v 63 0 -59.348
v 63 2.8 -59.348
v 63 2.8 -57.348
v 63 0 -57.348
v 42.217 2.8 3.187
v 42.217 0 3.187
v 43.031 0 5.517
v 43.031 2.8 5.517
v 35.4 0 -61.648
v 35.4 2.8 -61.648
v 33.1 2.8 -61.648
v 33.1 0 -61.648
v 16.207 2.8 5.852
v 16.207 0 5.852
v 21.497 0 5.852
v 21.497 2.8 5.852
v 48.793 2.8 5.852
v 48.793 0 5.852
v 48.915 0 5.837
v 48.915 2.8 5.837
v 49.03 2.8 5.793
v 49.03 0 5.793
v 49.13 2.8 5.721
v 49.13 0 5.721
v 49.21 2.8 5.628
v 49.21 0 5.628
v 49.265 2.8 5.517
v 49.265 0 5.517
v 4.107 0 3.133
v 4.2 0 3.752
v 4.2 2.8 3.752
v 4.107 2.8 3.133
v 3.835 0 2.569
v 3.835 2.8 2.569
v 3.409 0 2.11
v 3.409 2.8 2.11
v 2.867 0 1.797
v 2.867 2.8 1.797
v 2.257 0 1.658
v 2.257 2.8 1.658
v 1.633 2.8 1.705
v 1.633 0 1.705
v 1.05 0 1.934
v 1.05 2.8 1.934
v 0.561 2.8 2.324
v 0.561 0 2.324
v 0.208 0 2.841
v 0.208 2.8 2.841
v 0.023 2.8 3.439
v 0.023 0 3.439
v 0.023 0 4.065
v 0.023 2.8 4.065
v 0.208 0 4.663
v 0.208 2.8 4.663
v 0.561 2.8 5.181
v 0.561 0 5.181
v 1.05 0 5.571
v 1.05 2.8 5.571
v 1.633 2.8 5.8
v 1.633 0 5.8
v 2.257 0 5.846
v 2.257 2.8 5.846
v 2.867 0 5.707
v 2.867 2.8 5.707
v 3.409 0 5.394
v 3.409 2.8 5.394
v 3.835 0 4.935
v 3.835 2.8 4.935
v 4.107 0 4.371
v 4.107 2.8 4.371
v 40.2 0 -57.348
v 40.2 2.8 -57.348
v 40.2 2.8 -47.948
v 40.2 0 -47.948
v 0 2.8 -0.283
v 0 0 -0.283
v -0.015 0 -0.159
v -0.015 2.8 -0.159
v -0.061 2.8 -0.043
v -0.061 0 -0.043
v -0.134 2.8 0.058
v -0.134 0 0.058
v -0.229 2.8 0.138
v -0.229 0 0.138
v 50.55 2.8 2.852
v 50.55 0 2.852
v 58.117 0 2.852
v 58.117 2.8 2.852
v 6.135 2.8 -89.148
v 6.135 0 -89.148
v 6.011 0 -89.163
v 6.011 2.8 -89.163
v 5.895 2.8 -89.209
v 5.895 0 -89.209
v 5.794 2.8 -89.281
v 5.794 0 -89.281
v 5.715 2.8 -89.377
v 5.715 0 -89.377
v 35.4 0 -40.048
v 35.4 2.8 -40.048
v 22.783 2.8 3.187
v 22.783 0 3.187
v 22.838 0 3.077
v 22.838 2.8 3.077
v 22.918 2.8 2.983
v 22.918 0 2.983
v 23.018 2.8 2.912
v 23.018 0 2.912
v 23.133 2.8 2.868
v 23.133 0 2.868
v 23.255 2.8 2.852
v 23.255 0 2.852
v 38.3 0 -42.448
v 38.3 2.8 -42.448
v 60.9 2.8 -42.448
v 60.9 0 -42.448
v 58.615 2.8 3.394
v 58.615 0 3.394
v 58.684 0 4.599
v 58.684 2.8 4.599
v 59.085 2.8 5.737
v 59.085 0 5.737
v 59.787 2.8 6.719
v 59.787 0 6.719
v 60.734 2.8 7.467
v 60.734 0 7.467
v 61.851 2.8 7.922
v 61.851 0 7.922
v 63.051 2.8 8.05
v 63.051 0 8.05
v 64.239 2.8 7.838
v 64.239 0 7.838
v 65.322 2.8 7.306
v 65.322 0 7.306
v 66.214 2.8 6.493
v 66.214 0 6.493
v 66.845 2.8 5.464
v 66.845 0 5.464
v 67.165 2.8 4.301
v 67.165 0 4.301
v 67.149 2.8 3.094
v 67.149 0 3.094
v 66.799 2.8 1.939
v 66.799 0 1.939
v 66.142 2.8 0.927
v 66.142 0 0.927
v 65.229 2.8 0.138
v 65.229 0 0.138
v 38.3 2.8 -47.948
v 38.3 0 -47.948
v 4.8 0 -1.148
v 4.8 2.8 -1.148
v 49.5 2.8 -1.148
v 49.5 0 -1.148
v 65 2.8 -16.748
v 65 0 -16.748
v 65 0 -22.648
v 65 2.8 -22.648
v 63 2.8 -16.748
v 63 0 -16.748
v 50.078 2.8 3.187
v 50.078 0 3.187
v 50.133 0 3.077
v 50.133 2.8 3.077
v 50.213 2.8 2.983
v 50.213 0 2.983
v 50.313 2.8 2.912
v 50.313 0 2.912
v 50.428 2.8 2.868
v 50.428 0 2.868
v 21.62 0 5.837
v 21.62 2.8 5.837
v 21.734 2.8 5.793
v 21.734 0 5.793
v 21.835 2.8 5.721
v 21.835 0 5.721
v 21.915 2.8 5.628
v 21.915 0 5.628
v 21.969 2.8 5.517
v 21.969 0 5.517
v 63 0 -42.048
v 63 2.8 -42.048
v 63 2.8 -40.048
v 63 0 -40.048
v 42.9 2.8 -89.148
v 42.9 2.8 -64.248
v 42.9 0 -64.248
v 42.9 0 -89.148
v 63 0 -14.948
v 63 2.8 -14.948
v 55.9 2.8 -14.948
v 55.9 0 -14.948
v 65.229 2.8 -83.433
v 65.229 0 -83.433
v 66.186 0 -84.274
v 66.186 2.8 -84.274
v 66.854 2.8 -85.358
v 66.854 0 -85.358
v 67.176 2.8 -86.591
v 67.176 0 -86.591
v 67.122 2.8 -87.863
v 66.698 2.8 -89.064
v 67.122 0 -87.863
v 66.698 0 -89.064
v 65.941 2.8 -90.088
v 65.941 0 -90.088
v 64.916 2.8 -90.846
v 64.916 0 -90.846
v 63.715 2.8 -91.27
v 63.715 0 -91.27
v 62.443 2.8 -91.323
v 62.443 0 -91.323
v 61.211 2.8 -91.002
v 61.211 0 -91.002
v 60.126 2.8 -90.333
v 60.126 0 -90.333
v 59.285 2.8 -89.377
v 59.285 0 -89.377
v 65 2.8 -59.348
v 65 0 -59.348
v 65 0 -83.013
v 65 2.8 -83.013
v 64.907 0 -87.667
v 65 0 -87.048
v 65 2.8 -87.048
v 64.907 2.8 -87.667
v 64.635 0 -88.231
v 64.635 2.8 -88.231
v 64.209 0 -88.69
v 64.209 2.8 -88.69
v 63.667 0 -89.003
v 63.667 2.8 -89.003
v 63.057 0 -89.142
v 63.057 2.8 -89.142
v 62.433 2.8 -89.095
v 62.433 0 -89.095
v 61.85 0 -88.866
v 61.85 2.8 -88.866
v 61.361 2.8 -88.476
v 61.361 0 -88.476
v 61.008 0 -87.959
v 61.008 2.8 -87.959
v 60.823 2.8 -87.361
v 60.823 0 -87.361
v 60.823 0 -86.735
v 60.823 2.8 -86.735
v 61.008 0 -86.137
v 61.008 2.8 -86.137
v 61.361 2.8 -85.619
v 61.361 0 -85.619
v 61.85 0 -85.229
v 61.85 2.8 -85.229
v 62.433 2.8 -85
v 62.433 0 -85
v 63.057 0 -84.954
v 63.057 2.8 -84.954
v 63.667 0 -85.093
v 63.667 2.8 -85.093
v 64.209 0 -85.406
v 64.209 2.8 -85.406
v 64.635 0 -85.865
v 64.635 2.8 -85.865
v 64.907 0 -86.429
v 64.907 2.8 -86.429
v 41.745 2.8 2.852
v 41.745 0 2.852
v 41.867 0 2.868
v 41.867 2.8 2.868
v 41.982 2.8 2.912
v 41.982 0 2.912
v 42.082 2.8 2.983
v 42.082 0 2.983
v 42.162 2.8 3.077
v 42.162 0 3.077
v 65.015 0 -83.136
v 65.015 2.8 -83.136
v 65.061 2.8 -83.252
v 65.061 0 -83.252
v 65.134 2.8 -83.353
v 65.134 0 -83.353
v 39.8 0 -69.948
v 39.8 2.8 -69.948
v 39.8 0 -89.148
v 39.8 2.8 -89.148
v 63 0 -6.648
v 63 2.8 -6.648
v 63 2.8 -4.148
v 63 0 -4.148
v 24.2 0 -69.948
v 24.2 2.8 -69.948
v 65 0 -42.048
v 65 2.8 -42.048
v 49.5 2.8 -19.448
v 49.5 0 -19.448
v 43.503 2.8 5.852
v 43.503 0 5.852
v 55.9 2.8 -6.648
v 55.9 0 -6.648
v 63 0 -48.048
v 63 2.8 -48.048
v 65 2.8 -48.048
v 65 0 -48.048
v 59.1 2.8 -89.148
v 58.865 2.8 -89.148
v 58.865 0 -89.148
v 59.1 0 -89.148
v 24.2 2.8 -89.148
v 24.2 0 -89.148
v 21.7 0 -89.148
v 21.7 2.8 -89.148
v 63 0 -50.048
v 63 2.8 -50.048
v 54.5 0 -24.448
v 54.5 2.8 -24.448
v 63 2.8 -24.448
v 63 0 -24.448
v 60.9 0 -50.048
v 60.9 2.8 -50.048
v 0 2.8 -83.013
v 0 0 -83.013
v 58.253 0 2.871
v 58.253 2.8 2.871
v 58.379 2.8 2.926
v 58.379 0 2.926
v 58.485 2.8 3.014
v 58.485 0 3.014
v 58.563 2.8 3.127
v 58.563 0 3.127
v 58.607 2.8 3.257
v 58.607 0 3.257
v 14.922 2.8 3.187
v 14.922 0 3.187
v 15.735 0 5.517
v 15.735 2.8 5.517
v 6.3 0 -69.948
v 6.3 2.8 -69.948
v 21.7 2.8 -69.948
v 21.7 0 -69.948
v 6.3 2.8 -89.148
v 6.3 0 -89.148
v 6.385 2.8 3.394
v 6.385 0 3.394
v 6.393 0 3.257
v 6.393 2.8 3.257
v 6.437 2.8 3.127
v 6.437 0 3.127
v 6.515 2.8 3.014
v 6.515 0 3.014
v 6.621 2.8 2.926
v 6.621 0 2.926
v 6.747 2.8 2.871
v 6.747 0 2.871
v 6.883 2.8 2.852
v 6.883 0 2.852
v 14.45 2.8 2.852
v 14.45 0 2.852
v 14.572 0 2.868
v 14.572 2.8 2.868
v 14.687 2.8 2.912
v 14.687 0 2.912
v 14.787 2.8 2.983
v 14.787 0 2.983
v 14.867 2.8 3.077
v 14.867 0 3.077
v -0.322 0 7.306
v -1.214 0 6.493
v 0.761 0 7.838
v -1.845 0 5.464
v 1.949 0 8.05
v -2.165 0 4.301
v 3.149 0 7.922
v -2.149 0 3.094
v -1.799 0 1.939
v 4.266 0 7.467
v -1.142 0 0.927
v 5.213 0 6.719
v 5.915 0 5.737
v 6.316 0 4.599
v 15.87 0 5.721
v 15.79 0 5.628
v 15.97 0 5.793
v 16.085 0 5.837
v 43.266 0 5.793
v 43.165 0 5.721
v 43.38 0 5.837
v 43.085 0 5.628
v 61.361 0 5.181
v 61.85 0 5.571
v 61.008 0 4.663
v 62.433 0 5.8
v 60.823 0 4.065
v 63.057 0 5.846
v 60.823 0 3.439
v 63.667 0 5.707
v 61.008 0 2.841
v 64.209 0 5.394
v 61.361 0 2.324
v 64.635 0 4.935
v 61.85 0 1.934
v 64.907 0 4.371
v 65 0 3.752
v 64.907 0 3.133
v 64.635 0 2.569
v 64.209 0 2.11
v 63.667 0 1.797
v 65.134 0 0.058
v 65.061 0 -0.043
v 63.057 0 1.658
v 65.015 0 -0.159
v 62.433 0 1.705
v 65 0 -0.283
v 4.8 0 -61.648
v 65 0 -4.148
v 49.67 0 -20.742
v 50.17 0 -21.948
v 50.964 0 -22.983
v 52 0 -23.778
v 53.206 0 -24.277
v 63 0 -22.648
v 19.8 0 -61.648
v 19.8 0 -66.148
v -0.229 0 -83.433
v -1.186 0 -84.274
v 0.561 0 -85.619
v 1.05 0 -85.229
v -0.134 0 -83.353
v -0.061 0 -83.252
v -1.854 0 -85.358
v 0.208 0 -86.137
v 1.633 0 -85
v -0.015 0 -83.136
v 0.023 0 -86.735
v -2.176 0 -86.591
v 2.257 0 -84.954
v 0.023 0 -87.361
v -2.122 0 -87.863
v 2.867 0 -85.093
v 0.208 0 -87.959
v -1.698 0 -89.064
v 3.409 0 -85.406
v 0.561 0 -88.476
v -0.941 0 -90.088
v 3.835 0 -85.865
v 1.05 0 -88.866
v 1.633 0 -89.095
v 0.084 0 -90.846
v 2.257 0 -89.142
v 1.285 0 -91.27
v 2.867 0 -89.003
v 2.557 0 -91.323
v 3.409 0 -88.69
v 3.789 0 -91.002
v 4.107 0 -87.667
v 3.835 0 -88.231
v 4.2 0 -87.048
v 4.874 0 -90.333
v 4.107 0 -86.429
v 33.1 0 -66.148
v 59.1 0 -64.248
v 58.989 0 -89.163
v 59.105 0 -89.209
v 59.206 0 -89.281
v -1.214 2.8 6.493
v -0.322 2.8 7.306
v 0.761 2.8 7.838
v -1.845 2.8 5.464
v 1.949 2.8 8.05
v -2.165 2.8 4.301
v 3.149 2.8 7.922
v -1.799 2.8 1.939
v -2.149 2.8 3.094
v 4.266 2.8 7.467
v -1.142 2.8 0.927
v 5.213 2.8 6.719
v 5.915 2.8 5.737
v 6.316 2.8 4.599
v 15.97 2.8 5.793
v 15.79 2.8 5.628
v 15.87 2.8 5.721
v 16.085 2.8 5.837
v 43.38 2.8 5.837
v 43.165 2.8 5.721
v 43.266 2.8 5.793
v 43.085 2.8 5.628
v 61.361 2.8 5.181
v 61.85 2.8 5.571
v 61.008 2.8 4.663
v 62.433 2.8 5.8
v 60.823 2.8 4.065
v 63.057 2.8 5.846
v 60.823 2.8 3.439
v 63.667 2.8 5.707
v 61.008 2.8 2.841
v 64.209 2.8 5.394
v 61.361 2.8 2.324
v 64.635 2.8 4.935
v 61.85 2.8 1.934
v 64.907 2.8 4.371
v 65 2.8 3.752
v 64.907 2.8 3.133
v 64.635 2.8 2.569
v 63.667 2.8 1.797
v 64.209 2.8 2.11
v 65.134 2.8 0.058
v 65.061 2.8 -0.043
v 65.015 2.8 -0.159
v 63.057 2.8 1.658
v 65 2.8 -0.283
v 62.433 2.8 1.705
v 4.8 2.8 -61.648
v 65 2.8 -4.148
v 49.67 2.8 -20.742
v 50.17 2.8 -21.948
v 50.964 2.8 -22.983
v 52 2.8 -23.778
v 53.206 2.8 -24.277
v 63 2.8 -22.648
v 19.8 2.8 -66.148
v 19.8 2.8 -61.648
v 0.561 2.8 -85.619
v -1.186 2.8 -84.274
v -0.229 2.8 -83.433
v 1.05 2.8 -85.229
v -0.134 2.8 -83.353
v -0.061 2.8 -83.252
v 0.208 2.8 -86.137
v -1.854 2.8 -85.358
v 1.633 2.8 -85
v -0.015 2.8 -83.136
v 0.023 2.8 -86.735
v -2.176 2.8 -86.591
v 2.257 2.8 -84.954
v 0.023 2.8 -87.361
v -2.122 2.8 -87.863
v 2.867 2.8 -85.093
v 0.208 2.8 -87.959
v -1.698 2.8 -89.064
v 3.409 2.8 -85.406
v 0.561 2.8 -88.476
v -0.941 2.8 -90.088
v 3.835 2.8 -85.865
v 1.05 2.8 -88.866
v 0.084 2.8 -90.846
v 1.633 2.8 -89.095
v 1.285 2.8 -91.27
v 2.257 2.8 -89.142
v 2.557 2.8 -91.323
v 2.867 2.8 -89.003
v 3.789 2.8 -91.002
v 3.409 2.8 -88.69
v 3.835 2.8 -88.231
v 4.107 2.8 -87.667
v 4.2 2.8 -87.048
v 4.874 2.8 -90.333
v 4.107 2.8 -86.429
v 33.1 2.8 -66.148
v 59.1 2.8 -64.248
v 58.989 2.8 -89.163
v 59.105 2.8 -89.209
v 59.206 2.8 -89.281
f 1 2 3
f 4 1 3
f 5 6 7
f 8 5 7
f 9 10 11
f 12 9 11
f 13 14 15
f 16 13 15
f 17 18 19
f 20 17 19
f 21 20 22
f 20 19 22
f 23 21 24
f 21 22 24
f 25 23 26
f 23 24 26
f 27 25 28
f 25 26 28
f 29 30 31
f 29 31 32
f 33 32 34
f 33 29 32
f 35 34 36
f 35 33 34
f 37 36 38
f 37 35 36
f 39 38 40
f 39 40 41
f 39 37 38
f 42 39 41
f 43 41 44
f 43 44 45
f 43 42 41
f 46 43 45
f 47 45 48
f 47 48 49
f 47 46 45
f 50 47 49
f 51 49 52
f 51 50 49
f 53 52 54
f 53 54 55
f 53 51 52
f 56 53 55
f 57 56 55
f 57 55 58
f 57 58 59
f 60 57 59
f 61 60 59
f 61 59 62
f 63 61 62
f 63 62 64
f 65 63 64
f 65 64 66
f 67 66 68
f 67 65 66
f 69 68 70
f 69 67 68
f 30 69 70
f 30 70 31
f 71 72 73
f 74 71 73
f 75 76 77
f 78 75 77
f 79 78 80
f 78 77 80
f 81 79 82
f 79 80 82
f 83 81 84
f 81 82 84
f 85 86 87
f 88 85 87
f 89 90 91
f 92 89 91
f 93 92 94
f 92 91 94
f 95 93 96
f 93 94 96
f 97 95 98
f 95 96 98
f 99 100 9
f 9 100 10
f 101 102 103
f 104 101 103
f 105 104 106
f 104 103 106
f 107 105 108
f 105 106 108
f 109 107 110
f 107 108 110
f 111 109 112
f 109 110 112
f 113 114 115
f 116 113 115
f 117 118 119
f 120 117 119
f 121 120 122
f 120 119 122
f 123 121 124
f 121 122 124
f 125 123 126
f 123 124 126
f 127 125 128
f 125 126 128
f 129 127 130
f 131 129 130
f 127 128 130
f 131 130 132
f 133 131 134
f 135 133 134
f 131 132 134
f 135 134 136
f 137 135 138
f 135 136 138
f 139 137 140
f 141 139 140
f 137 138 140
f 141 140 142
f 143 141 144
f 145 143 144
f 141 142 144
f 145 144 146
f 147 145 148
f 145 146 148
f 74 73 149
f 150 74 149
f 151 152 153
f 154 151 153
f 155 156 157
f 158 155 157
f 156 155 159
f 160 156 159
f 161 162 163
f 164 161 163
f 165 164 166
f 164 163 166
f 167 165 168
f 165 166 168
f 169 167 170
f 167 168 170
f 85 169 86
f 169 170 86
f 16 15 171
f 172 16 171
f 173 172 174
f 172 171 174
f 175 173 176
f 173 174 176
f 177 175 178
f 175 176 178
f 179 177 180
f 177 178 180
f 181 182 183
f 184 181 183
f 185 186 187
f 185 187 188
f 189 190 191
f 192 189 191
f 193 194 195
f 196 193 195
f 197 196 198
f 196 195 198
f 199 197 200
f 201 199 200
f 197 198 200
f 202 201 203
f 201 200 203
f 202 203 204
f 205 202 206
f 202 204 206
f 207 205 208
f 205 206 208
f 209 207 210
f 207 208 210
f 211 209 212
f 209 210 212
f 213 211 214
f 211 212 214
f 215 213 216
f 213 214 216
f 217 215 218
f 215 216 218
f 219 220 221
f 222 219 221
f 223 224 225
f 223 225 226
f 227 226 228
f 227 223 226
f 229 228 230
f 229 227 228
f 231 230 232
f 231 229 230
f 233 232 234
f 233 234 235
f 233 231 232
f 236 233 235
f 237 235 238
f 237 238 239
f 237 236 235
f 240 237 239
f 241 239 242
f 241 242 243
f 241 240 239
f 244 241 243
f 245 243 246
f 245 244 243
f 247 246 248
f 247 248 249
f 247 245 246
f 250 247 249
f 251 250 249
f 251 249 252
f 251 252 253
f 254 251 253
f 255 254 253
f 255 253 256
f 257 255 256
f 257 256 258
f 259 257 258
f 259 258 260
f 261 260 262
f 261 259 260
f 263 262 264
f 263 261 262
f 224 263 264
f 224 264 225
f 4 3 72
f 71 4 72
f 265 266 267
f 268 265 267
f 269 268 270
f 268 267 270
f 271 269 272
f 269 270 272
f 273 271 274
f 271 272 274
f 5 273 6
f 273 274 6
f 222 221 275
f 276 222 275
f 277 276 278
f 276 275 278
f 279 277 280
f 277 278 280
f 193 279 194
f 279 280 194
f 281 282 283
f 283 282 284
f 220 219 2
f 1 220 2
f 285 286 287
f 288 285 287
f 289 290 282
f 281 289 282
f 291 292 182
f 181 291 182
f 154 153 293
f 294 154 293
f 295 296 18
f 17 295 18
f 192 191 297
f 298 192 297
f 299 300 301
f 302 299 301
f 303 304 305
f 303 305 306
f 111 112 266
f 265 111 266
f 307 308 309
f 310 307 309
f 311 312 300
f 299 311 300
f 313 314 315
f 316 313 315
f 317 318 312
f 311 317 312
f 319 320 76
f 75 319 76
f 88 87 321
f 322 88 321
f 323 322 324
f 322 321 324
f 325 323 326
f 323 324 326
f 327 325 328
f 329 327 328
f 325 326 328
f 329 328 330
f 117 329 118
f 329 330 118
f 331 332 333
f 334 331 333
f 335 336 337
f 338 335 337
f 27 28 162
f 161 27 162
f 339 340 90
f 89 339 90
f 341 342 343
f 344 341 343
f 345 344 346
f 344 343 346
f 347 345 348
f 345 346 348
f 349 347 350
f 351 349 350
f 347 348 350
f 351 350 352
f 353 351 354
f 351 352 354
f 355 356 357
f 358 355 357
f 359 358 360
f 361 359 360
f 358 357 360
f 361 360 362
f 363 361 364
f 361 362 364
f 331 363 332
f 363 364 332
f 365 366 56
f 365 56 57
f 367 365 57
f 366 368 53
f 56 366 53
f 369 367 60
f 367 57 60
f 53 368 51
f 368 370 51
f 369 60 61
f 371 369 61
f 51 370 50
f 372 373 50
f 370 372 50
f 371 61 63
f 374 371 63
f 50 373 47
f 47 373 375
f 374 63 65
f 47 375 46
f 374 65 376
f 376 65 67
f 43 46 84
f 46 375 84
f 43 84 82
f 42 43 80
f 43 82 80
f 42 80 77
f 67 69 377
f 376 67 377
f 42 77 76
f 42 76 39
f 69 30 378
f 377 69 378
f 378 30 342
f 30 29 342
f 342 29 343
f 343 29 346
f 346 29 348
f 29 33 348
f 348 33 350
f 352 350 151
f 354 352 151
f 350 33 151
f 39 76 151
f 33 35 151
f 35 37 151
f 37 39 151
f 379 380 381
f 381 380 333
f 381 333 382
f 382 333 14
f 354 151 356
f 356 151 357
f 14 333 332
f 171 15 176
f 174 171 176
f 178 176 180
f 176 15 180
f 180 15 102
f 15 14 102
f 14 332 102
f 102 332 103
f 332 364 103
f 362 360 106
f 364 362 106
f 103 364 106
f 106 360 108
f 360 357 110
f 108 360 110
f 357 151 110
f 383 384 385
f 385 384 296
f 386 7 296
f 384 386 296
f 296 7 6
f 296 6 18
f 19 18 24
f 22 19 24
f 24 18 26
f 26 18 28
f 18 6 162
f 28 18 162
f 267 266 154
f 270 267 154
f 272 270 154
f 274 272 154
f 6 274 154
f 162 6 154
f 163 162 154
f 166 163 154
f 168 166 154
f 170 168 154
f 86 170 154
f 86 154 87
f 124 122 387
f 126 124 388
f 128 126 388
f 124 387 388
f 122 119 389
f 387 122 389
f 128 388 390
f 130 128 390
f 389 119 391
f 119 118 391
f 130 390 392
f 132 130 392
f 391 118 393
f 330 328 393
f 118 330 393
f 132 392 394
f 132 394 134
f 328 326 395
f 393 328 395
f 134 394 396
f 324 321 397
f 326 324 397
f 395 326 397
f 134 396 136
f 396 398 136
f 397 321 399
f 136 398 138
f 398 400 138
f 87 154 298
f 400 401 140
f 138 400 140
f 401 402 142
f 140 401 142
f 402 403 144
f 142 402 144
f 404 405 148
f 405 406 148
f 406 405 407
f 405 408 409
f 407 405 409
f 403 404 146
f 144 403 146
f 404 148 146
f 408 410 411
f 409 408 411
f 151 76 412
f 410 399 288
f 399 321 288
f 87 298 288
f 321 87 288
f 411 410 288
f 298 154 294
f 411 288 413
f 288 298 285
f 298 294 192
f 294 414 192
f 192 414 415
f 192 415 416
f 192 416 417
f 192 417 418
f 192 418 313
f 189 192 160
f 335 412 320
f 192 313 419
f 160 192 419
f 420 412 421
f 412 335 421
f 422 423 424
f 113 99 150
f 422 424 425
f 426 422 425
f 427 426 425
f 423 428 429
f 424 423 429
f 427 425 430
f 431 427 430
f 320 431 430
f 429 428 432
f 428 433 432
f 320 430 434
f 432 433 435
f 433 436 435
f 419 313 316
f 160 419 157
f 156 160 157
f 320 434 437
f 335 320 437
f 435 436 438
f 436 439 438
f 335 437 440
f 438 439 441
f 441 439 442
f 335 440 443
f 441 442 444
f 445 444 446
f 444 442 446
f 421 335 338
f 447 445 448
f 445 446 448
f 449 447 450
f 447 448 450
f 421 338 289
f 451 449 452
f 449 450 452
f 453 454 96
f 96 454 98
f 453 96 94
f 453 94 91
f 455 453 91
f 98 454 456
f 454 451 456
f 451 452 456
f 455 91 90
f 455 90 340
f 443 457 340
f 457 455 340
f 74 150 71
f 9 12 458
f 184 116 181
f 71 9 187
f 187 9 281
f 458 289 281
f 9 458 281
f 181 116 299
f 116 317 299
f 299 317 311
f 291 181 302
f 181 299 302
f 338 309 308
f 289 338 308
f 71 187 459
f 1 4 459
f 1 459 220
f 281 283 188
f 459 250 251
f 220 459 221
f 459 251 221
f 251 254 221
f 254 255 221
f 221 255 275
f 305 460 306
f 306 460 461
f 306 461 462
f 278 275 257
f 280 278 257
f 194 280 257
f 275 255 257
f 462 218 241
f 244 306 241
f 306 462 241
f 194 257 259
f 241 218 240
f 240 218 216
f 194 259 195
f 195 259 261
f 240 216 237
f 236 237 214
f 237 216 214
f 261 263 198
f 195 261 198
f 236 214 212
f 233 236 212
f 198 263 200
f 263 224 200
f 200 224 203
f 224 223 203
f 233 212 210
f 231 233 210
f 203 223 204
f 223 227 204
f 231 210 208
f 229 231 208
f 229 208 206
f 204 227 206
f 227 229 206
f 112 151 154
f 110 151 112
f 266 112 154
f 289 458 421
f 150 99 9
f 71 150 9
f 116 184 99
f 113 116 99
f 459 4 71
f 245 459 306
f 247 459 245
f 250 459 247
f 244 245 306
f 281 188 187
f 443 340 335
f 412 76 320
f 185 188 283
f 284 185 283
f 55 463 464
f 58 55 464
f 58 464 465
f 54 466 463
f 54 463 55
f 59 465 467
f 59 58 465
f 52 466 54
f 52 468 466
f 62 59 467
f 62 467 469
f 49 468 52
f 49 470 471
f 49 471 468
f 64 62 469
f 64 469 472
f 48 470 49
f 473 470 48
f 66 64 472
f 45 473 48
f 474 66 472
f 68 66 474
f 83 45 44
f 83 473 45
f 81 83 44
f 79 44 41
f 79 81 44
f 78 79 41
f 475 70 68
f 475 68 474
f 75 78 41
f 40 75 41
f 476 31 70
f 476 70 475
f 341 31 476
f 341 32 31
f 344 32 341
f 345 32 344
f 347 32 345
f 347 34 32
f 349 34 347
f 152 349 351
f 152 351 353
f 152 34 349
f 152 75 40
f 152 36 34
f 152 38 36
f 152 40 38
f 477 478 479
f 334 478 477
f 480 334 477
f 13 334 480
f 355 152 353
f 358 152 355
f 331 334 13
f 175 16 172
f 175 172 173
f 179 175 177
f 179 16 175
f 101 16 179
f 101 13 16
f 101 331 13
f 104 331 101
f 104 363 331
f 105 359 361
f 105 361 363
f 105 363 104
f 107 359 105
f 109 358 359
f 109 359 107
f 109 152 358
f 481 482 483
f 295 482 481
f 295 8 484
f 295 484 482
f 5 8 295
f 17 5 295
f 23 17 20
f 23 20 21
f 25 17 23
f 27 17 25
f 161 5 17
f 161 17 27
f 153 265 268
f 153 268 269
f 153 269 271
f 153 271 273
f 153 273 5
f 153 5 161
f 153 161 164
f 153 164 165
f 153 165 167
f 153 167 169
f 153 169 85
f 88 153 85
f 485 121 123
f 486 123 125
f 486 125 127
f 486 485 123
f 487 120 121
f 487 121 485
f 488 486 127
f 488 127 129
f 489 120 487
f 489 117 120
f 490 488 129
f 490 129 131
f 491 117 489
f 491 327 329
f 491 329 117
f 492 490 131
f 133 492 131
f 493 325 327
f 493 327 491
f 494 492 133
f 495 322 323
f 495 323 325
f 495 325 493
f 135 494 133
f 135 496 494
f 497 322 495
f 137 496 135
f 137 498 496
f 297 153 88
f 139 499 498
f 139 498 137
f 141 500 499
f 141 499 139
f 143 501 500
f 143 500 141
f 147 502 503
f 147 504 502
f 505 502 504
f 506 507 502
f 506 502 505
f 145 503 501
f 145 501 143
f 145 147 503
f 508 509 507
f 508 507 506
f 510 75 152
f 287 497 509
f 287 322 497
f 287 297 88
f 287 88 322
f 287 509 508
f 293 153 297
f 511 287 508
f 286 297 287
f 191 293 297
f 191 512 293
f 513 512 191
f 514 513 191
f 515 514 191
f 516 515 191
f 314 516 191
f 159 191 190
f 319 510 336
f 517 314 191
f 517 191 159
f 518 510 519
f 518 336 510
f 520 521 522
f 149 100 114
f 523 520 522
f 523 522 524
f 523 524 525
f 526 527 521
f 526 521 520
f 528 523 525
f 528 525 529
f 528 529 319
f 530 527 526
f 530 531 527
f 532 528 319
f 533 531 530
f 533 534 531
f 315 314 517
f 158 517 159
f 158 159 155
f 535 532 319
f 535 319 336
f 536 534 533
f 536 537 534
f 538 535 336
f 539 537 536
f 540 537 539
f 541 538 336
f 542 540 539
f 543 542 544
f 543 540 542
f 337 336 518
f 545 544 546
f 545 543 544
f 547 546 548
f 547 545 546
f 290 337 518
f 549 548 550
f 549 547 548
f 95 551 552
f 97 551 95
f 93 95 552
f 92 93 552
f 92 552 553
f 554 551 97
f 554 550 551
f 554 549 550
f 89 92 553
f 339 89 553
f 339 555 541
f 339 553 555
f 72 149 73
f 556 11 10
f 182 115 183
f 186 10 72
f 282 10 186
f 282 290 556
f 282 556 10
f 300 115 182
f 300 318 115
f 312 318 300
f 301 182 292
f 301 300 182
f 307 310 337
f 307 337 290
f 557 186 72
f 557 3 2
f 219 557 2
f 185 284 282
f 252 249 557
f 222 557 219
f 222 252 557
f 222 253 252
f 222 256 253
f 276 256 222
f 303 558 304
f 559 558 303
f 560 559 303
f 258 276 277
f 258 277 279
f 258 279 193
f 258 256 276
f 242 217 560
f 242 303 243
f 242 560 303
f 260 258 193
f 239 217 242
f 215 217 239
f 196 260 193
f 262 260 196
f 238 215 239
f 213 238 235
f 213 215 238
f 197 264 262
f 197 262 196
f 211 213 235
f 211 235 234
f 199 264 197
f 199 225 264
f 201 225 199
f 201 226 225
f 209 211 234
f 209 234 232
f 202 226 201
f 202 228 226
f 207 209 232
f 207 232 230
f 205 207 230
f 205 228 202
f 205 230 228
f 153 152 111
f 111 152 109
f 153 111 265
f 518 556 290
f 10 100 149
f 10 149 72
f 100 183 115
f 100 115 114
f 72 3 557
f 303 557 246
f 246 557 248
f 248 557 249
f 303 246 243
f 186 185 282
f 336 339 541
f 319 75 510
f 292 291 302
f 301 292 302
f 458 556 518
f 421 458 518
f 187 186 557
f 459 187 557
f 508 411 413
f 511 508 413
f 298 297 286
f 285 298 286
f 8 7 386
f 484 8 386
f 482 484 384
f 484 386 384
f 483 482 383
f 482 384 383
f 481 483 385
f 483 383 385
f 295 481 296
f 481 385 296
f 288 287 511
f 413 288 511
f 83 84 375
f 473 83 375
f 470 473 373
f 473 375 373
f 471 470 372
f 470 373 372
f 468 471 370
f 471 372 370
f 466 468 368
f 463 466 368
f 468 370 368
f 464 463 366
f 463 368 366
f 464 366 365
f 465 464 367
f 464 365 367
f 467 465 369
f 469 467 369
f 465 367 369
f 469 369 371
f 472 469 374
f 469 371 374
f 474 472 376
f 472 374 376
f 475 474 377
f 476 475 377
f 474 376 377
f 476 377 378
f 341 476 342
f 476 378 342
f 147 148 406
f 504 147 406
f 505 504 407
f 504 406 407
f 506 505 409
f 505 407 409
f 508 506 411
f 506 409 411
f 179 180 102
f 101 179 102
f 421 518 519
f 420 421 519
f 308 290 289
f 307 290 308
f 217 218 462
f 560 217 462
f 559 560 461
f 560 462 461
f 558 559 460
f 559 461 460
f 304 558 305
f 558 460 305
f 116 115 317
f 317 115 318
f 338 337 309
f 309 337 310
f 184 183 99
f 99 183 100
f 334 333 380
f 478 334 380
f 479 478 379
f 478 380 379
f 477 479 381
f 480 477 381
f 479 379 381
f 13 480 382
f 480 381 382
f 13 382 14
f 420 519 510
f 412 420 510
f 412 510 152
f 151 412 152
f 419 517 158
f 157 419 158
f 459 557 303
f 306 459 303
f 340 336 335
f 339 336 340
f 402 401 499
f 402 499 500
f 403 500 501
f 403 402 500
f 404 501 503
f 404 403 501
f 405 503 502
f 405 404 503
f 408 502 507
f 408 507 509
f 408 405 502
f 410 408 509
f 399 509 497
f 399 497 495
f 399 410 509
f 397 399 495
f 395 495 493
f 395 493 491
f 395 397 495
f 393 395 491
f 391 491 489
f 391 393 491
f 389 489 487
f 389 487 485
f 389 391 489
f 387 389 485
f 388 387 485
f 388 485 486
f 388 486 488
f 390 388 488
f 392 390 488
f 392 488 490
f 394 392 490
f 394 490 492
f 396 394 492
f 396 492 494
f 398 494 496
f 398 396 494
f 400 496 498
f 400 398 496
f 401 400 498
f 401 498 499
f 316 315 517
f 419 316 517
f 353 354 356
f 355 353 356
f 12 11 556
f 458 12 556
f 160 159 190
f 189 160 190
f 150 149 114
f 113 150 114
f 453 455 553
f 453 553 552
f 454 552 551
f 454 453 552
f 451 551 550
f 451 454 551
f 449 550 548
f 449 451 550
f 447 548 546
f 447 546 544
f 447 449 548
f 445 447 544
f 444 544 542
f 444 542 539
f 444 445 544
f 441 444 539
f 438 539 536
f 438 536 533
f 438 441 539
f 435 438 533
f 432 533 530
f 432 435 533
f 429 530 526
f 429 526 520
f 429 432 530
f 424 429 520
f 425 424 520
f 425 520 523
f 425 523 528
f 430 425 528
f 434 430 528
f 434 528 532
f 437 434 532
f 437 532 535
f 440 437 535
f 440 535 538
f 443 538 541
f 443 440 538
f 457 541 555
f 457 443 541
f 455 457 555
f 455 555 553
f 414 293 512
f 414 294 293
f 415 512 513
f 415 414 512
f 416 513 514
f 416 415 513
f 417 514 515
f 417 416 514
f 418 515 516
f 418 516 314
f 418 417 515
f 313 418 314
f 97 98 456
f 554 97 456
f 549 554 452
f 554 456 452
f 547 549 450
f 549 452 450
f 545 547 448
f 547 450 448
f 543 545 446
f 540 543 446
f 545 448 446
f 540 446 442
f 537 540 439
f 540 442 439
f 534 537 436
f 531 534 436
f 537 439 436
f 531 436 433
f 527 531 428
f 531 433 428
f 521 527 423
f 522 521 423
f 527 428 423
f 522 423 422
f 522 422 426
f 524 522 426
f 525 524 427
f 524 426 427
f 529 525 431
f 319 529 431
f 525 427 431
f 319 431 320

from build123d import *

# Parameters (mm, degrees)
BASEPLATE_OUTLINE_R = 2.1
BASEPLATE_DEPTH     = 2.8
CUT_EXTRUDE1_REACH  = 115.438
SKETCH3_W           = 15.4
SKETCH3_H           = 19.2
SKETCH3_W_2         = 15.6
SKETCH3_W_3         = 16.2
SKETCH3_H_2         = 24.9
CUT_EXTRUDE2_REACH  = 115.438
FILLET1_R           = 5


# Read off the part's stored shape, not the designer's step: BasePlate
with BuildPart() as part:
    # BasePlate outline → BasePlate (new body)
    with BuildSketch(Plane(origin=(0, 0, 0), x_dir=(1, 0, 0), z_dir=(0, 1, 0))):
        with BuildLine():
            Line((43.502626614, -5.852332608), (48.792614178, -5.852332608))
            ThreePointArc((48.792614178, -5.852332608), (49.082078508, -5.760021707), (49.264659986, -5.517174213))
            Line((49.264659986, -5.517174213), (50.078201202, -3.187491002))
            ThreePointArc((50.078201202, -3.187491002), (50.26078268, -2.944643509), (50.55024701, -2.852332608))
            Line((50.55024701, -2.852332608), (58.116695703, -2.852332608))
            ThreePointArc((58.116695703, -2.852332608), (58.484685739, -3.013831008), (58.614956567, -3.393999275))
            ThreePointArc((58.614956567, -3.393999275), (64.799237397, -7.61016844), (65.229166667, -0.137781095))
            ThreePointArc((65.229166667, -0.137781095), (65.061014427, 0.043158816), (65, 0.282515593))
            Line((65, 0.282515593), (65, 83.012819192))
            ThreePointArc((65, 83.012819192), (65.061014427, 83.252175969), (65.229166667, 83.433115879))
            ThreePointArc((65.229166667, 83.433115879), (65.940559159, 90.088226551), (59.285448487, 89.376834059))
            ThreePointArc((59.285448487, 89.376834059), (59.104508577, 89.208681819), (58.8651518, 89.147667392))
            Line((58.8651518, 89.147667392), (6.1348482, 89.147667392))
            ThreePointArc((6.1348482, 89.147667392), (5.895491423, 89.208681819), (5.714551513, 89.376834059))
            ThreePointArc((5.714551513, 89.376834059), (-0.940559159, 90.088226551), (-0.229166667, 83.433115879))
            ThreePointArc((-0.229166667, 83.433115879), (-0.061014427, 83.252175969), (0, 83.012819192))
            Line((0, 83.012819192), (0, 0.282515593))
            ThreePointArc((0, 0.282515593), (-0.061014427, 0.043158816), (-0.229166667, -0.137781095))
            ThreePointArc((-0.229166667, -0.137781095), (0.200762603, -7.61016844), (6.385043433, -3.393999275))
            ThreePointArc((6.385043433, -3.393999275), (6.515314261, -3.013831008), (6.883304297, -2.852332608))
            Line((6.883304297, -2.852332608), (14.44975299, -2.852332608))
            ThreePointArc((14.44975299, -2.852332608), (14.73921732, -2.944643509), (14.921798798, -3.187491002))
            Line((14.921798798, -3.187491002), (15.735340014, -5.517174213))
            ThreePointArc((15.735340014, -5.517174213), (15.917921492, -5.760021707), (16.207385822, -5.852332608))
            Line((16.207385822, -5.852332608), (21.497373386, -5.852332608))
            ThreePointArc((21.497373386, -5.852332608), (21.786837716, -5.760021707), (21.969419194, -5.517174213))
            Line((21.969419194, -5.517174213), (22.78296041, -3.187491002))
            ThreePointArc((22.78296041, -3.187491002), (22.965541888, -2.944643509), (23.255006218, -2.852332608))
            Line((23.255006218, -2.852332608), (41.744993782, -2.852332608))
            ThreePointArc((41.744993782, -2.852332608), (42.034458112, -2.944643509), (42.21703959, -3.187491002))
            Line((42.21703959, -3.187491002), (43.030580806, -5.517174213))
            ThreePointArc((43.030580806, -5.517174213), (43.213162284, -5.760021707), (43.502626614, -5.852332608))
        make_face()
        with Locations((2.1, -3.752332608)):
            Circle(BASEPLATE_OUTLINE_R, mode=Mode.SUBTRACT)
        with Locations((62.9, -3.752332608)):
            Circle(BASEPLATE_OUTLINE_R, mode=Mode.SUBTRACT)
        with Locations((2.1, 87.047667392)):
            Circle(BASEPLATE_OUTLINE_R, mode=Mode.SUBTRACT)
        with Locations((62.9, 87.047667392)):
            Circle(BASEPLATE_OUTLINE_R, mode=Mode.SUBTRACT)
    extrude(amount=BASEPLATE_DEPTH)

    # Sketch3 → Cut-Extrude1 (cut, up to next)
    with BuildSketch(Plane(origin=(0, 2.8, 0), x_dir=(1, 0, 0), z_dir=(0, 1, 0)), mode=Mode.PRIVATE) as cut_extrude1_sk1:
        Polygon((4.8, 1.147667392), (49.5, 1.147667392), (49.5, 24.447667392), (63, 24.447667392), (63, 22.647667392), (65, 22.647667392), (65, 42.047667392), (63, 42.047667392), (63, 40.047667392), (35.4, 40.047667392), (35.4, 61.647667392), (33.1, 61.647667392), (33.1, 66.147667392), (19.8, 66.147667392), (19.8, 61.647667392), (4.8, 61.647667392), align=None)
    cut_extrude1_tool1 = extrude(cut_extrude1_sk1.sketch, amount=-CUT_EXTRUDE1_REACH, mode=Mode.PRIVATE) & part.part
    # Sketch3 → Cut-Extrude1 (cut, up to next)
    with BuildSketch(Plane(origin=(0, 2.8, 0), x_dir=(1, 0, 0), z_dir=(0, 1, 0)), mode=Mode.PRIVATE) as cut_extrude1_sk2:
        Polygon((55.9, 6.647667392), (63, 6.647667392), (63, 4.147667392), (65, 4.147667392), (65, 16.747667392), (63, 16.747667392), (63, 14.947667392), (55.9, 14.947667392), align=None)
    cut_extrude1_tool2 = extrude(cut_extrude1_sk2.sketch, amount=-CUT_EXTRUDE1_REACH, mode=Mode.PRIVATE) & part.part
    # Sketch3 → Cut-Extrude1 (cut, up to next)
    with BuildSketch(Plane(origin=(0, 2.8, 0), x_dir=(1, 0, 0), z_dir=(0, 1, 0)), mode=Mode.PRIVATE) as cut_extrude1_sk3:
        with Locations((14, 79.547667392)):
            Rectangle(SKETCH3_W, SKETCH3_H)
    cut_extrude1_tool3 = extrude(cut_extrude1_sk3.sketch, amount=-CUT_EXTRUDE1_REACH, mode=Mode.PRIVATE) & part.part
    # Sketch3 → Cut-Extrude1 (cut, up to next)
    with BuildSketch(Plane(origin=(0, 2.8, 0), x_dir=(1, 0, 0), z_dir=(0, 1, 0)), mode=Mode.PRIVATE) as cut_extrude1_sk4:
        with Locations((32, 79.547667392)):
            Rectangle(SKETCH3_W_2, SKETCH3_H)
    cut_extrude1_tool4 = extrude(cut_extrude1_sk4.sketch, amount=-CUT_EXTRUDE1_REACH, mode=Mode.PRIVATE) & part.part
    # Sketch3 → Cut-Extrude1 (cut, up to next)
    with BuildSketch(Plane(origin=(0, 2.8, 0), x_dir=(1, 0, 0), z_dir=(0, 1, 0)), mode=Mode.PRIVATE) as cut_extrude1_sk5:
        with Locations((51, 76.697667392)):
            Rectangle(SKETCH3_W_3, SKETCH3_H_2)
    cut_extrude1_tool5 = extrude(cut_extrude1_sk5.sketch, amount=-CUT_EXTRUDE1_REACH, mode=Mode.PRIVATE) & part.part
    add(cut_extrude1_tool1.solids().sort_by_distance((28.204461, 2.8, -30.008726))[0], mode=Mode.SUBTRACT)
    add(cut_extrude1_tool2.solids().sort_by_distance((60.812891, 2.8, -10.69283))[0], mode=Mode.SUBTRACT)
    add(cut_extrude1_tool3.solids().sort_by_distance((14, 2.8, -79.547667))[0], mode=Mode.SUBTRACT)
    add(cut_extrude1_tool4.solids().sort_by_distance((32, 2.8, -79.547667))[0], mode=Mode.SUBTRACT)
    add(cut_extrude1_tool5.solids().sort_by_distance((51, 2.8, -76.697667))[0], mode=Mode.SUBTRACT)

    # Sketch4 → Cut-Extrude2 (cut, up to next)
    with BuildSketch(Plane(origin=(0, 2.8, 0), x_dir=(1, 0, 0), z_dir=(0, 1, 0)), mode=Mode.PRIVATE) as cut_extrude2_sk1:
        Polygon((65, 59.347667392), (63, 59.347667392), (63, 57.347667392), (40.2, 57.347667392), (40.2, 47.947667392), (38.3, 47.947667392), (38.3, 42.447667392), (60.9, 42.447667392), (60.9, 50.047667392), (63, 50.047667392), (63, 48.047667392), (65, 48.047667392), align=None)
    cut_extrude2_tool1 = extrude(cut_extrude2_sk1.sketch, amount=-CUT_EXTRUDE2_REACH, mode=Mode.PRIVATE) & part.part
    add(cut_extrude2_tool1.solids().sort_by_distance((51.560754, 2.8, -50.163969))[0], mode=Mode.SUBTRACT)

    # Fillet1
    fillet1_edges = [part.edges().sort_by_distance(p)[0] for p in [
        (49.5, 1.4, -24.447667392),
    ]]
    fillet(fillet1_edges, radius=FILLET1_R)


solid = part.part
